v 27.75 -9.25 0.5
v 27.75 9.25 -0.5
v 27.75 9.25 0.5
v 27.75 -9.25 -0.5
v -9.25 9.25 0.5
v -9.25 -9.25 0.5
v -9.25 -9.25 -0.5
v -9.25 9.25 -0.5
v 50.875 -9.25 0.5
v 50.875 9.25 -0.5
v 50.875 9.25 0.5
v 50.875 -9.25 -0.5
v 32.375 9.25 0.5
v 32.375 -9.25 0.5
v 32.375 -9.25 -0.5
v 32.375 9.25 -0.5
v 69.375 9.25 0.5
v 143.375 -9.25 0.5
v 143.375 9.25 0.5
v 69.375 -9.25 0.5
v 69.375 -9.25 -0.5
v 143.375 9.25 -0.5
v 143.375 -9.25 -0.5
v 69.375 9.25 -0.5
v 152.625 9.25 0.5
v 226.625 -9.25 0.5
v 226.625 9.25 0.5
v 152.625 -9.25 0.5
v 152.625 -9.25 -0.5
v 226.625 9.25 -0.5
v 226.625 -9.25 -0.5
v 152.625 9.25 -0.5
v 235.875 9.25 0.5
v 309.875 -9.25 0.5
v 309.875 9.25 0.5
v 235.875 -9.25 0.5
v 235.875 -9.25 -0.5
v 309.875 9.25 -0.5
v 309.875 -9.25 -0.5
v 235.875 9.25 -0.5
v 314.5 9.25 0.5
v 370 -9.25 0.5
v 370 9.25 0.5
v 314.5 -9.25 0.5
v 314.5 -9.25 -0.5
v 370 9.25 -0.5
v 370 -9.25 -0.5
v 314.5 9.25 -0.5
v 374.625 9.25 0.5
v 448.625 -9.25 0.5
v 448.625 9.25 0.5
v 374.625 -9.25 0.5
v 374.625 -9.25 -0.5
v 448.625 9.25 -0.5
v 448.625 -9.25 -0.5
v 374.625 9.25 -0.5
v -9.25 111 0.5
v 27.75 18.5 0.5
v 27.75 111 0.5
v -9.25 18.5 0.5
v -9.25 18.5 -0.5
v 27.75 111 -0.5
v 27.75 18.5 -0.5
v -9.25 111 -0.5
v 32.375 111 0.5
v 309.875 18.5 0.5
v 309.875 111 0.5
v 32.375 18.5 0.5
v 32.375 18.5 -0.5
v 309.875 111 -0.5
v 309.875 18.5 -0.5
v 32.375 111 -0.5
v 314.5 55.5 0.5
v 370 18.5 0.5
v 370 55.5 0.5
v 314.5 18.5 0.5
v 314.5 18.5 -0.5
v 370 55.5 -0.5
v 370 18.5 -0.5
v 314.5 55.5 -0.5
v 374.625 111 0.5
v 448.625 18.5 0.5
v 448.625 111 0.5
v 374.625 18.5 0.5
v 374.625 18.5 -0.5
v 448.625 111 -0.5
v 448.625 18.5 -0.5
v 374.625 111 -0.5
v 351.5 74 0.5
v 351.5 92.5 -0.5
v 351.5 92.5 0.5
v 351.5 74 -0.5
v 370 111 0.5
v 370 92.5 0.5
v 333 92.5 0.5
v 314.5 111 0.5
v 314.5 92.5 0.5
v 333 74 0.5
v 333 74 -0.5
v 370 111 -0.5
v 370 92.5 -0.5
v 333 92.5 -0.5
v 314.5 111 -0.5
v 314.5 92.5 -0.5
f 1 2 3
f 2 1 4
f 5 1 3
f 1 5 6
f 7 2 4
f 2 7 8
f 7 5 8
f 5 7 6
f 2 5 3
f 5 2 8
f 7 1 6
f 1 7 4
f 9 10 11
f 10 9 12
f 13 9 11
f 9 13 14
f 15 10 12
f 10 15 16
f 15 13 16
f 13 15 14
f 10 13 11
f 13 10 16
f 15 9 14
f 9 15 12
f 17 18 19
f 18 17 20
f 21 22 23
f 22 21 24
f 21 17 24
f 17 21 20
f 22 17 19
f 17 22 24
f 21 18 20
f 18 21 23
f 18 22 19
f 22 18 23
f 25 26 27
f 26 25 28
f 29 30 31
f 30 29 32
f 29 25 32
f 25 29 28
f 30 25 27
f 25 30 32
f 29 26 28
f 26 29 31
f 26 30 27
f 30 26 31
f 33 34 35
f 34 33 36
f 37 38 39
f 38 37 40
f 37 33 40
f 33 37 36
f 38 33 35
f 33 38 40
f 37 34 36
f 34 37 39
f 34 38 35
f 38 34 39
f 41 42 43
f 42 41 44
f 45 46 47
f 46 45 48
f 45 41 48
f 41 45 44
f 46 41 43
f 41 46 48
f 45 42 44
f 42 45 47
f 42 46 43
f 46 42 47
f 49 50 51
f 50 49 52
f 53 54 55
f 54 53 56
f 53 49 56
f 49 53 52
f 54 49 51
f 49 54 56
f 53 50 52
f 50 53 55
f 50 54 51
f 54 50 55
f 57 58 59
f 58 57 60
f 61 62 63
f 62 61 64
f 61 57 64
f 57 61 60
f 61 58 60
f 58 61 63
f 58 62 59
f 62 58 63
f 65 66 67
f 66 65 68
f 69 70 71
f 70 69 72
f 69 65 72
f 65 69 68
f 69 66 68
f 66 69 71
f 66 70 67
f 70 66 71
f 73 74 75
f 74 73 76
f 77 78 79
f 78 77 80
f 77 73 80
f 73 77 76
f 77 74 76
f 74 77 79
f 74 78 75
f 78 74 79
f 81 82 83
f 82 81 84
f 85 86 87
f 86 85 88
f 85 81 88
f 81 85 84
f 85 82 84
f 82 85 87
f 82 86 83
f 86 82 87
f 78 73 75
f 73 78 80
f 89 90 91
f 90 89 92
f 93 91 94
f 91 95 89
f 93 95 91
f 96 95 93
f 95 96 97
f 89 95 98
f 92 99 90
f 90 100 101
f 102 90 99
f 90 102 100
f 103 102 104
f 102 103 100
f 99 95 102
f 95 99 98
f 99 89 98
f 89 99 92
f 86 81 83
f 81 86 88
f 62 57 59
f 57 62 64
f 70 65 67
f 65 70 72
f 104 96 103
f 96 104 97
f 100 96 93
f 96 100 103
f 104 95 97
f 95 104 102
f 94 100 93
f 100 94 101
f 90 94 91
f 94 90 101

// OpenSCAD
translate(v=[0, 0, 0]){
    translate(v=[0, 0, 0]){
        translate(v=[9.25, 0.0, 0]){
            cube(size=[37.0, 18.5, 1], center=true);
        };
        translate(v=[41.625, 0.0, 0]){
            cube(size=[18.5, 18.5, 1], center=true);
        };
        translate(v=[78.625, 0.0, 0]){
            cube(size=[18.5, 18.5, 1], center=true);
        };
        translate(v=[97.125, 0.0, 0]){
            cube(size=[18.5, 18.5, 1], center=true);
        };
        translate(v=[115.625, 0.0, 0]){
            cube(size=[18.5, 18.5, 1], center=true);
        };
        translate(v=[134.125, 0.0, 0]){
            cube(size=[18.5, 18.5, 1], center=true);
        };
        translate(v=[161.875, 0.0, 0]){
            cube(size=[18.5, 18.5, 1], center=true);
        };
        translate(v=[180.375, 0.0, 0]){
            cube(size=[18.5, 18.5, 1], center=true);
        };
        translate(v=[198.875, 0.0, 0]){
            cube(size=[18.5, 18.5, 1], center=true);
        };
        translate(v=[217.375, 0.0, 0]){
            cube(size=[18.5, 18.5, 1], center=true);
        };
        translate(v=[245.125, 0.0, 0]){
            cube(size=[18.5, 18.5, 1], center=true);
        };
        translate(v=[263.625, 0.0, 0]){
            cube(size=[18.5, 18.5, 1], center=true);
        };
        translate(v=[282.125, 0.0, 0]){
            cube(size=[18.5, 18.5, 1], center=true);
        };
        translate(v=[300.625, 0.0, 0]){
            cube(size=[18.5, 18.5, 1], center=true);
        };
        translate(v=[323.75, 0.0, 0]){
            cube(size=[18.5, 18.5, 1], center=true);
        };
        translate(v=[342.25, 0.0, 0]){
            cube(size=[18.5, 18.5, 1], center=true);
        };
        translate(v=[360.75, 0.0, 0]){
            cube(size=[18.5, 18.5, 1], center=true);
        };
        translate(v=[383.875, 0.0, 0]){
            cube(size=[18.5, 18.5, 1], center=true);
        };
        translate(v=[402.375, 0.0, 0]){
            cube(size=[18.5, 18.5, 1], center=true);
        };
        translate(v=[420.875, 0.0, 0]){
            cube(size=[18.5, 18.5, 1], center=true);
        };
        translate(v=[439.375, 0.0, 0]){
            cube(size=[18.5, 18.5, 1], center=true);
        };
        translate(v=[0.0, 27.75, 0]){
            cube(size=[18.5, 18.5, 1], center=true);
        };
        translate(v=[18.5, 27.75, 0]){
            cube(size=[18.5, 18.5, 1], center=true);
        };
        translate(v=[41.625, 27.75, 0]){
            cube(size=[18.5, 18.5, 1], center=true);
        };
        translate(v=[60.125, 27.75, 0]){
            cube(size=[18.5, 18.5, 1], center=true);
        };
        translate(v=[78.625, 27.75, 0]){
            cube(size=[18.5, 18.5, 1], center=true);
        };
        translate(v=[97.125, 27.75, 0]){
            cube(size=[18.5, 18.5, 1], center=true);
        };
        translate(v=[115.625, 27.75, 0]){
            cube(size=[18.5, 18.5, 1], center=true);
        };
        translate(v=[134.125, 27.75, 0]){
            cube(size=[18.5, 18.5, 1], center=true);
        };
        translate(v=[152.625, 27.75, 0]){
            cube(size=[18.5, 18.5, 1], center=true);
        };
        translate(v=[171.125, 27.75, 0]){
            cube(size=[18.5, 18.5, 1], center=true);
        };
        translate(v=[189.625, 27.75, 0]){
            cube(size=[18.5, 18.5, 1], center=true);
        };
        translate(v=[208.125, 27.75, 0]){
            cube(size=[18.5, 18.5, 1], center=true);
        };
        translate(v=[226.625, 27.75, 0]){
            cube(size=[18.5, 18.5, 1], center=true);
        };
        translate(v=[245.125, 27.75, 0]){
            cube(size=[18.5, 18.5, 1], center=true);
        };
        translate(v=[263.625, 27.75, 0]){
            cube(size=[18.5, 18.5, 1], center=true);
        };
        translate(v=[291.375, 27.75, 0]){
            cube(size=[37.0, 18.5, 1], center=true);
        };
        translate(v=[323.75, 27.75, 0]){
            cube(size=[18.5, 18.5, 1], center=true);
        };
        translate(v=[342.25, 27.75, 0]){
            cube(size=[18.5, 18.5, 1], center=true);
        };
        translate(v=[360.75, 27.75, 0]){
            cube(size=[18.5, 18.5, 1], center=true);
        };
        translate(v=[383.875, 27.75, 0]){
            cube(size=[18.5, 18.5, 1], center=true);
        };
        translate(v=[402.375, 27.75, 0]){
            cube(size=[18.5, 18.5, 1], center=true);
        };
        translate(v=[420.875, 27.75, 0]){
            cube(size=[18.5, 18.5, 1], center=true);
        };
        translate(v=[439.375, 27.75, 0]){
            cube(size=[18.5, 18.5, 1], center=true);
        };
        translate(v=[0.0, 46.25, 0]){
            cube(size=[18.5, 18.5, 1], center=true);
        };
        translate(v=[18.5, 46.25, 0]){
            cube(size=[18.5, 18.5, 1], center=true);
        };
        translate(v=[46.25, 46.25, 0]){
            cube(size=[27.75, 18.5, 1], center=true);
        };
        translate(v=[69.375, 46.25, 0]){
            cube(size=[18.5, 18.5, 1], center=true);
        };
        translate(v=[87.875, 46.25, 0]){
            cube(size=[18.5, 18.5, 1], center=true);
        };
        translate(v=[106.375, 46.25, 0]){
            cube(size=[18.5, 18.5, 1], center=true);
        };
        translate(v=[124.875, 46.25, 0]){
            cube(size=[18.5, 18.5, 1], center=true);
        };
        translate(v=[143.375, 46.25, 0]){
            cube(size=[18.5, 18.5, 1], center=true);
        };
        translate(v=[161.875, 46.25, 0]){
            cube(size=[18.5, 18.5, 1], center=true);
        };
        translate(v=[180.375, 46.25, 0]){
            cube(size=[18.5, 18.5, 1], center=true);
        };
        translate(v=[198.875, 46.25, 0]){
            cube(size=[18.5, 18.5, 1], center=true);
        };
        translate(v=[217.375, 46.25, 0]){
            cube(size=[18.5, 18.5, 1], center=true);
        };
        translate(v=[235.875, 46.25, 0]){
            cube(size=[18.5, 18.5, 1], center=true);
        };
        translate(v=[254.375, 46.25, 0]){
            cube(size=[18.5, 18.5, 1], center=true);
        };
        translate(v=[272.875, 46.25, 0]){
            cube(size=[18.5, 18.5, 1], center=true);
        };
        translate(v=[293.6875, 46.25, 0]){
            cube(size=[27.75, 18.5, 1], center=true);
        };
        translate(v=[298.3125, 55.5, 0]){
            cube(size=[23.125, 37.0, 1], center=true);
        };
        translate(v=[323.75, 46.25, 0]){
            cube(size=[18.5, 18.5, 1], center=true);
        };
        translate(v=[342.25, 46.25, 0]){
            cube(size=[18.5, 18.5, 1], center=true);
        };
        translate(v=[360.75, 46.25, 0]){
            cube(size=[18.5, 18.5, 1], center=true);
        };
        translate(v=[383.875, 46.25, 0]){
            cube(size=[18.5, 18.5, 1], center=true);
        };
        translate(v=[402.375, 46.25, 0]){
            cube(size=[18.5, 18.5, 1], center=true);
        };
        translate(v=[420.875, 46.25, 0]){
            cube(size=[18.5, 18.5, 1], center=true);
        };
        translate(v=[439.375, 55.5, 0]){
            cube(size=[18.5, 37.0, 1], center=true);
        };
        translate(v=[0.0, 64.75, 0]){
            cube(size=[18.5, 18.5, 1], center=true);
        };
        translate(v=[18.5, 64.75, 0]){
            cube(size=[18.5, 18.5, 1], center=true);
        };
        translate(v=[48.5625, 64.75, 0]){
            cube(size=[32.375, 18.5, 1], center=true);
        };
        translate(v=[74.0, 64.75, 0]){
            cube(size=[18.5, 18.5, 1], center=true);
        };
        translate(v=[92.5, 64.75, 0]){
            cube(size=[18.5, 18.5, 1], center=true);
        };
        translate(v=[111.0, 64.75, 0]){
            cube(size=[18.5, 18.5, 1], center=true);
        };
        translate(v=[129.5, 64.75, 0]){
            cube(size=[18.5, 18.5, 1], center=true);
        };
        translate(v=[148.0, 64.75, 0]){
            cube(size=[18.5, 18.5, 1], center=true);
        };
        translate(v=[166.5, 64.75, 0]){
            cube(size=[18.5, 18.5, 1], center=true);
        };
        translate(v=[185.0, 64.75, 0]){
            cube(size=[18.5, 18.5, 1], center=true);
        };
        translate(v=[203.5, 64.75, 0]){
            cube(size=[18.5, 18.5, 1], center=true);
        };
        translate(v=[222.0, 64.75, 0]){
            cube(size=[18.5, 18.5, 1], center=true);
        };
        translate(v=[240.5, 64.75, 0]){
            cube(size=[18.5, 18.5, 1], center=true);
        };
        translate(v=[259.0, 64.75, 0]){
            cube(size=[18.5, 18.5, 1], center=true);
        };
        translate(v=[277.5, 64.75, 0]){
            cube(size=[18.5, 18.5, 1], center=true);
        };
        translate(v=[383.875, 64.75, 0]){
            cube(size=[18.5, 18.5, 1], center=true);
        };
        translate(v=[402.375, 64.75, 0]){
            cube(size=[18.5, 18.5, 1], center=true);
        };
        translate(v=[420.875, 64.75, 0]){
            cube(size=[18.5, 18.5, 1], center=true);
        };
        translate(v=[0.0, 83.25, 0]){
            cube(size=[18.5, 18.5, 1], center=true);
        };
        translate(v=[18.5, 83.25, 0]){
            cube(size=[18.5, 18.5, 1], center=true);
        };
        translate(v=[43.9375, 83.25, 0]){
            cube(size=[23.125, 18.5, 1], center=true);
        };
        translate(v=[64.75, 83.25, 0]){
            cube(size=[18.5, 18.5, 1], center=true);
        };
        translate(v=[83.25, 83.25, 0]){
            cube(size=[18.5, 18.5, 1], center=true);
        };
        translate(v=[101.75, 83.25, 0]){
            cube(size=[18.5, 18.5, 1], center=true);
        };
        translate(v=[120.25, 83.25, 0]){
            cube(size=[18.5, 18.5, 1], center=true);
        };
        translate(v=[138.75, 83.25, 0]){
            cube(size=[18.5, 18.5, 1], center=true);
        };
        translate(v=[157.25, 83.25, 0]){
            cube(size=[18.5, 18.5, 1], center=true);
        };
        translate(v=[175.75, 83.25, 0]){
            cube(size=[18.5, 18.5, 1], center=true);
        };
        translate(v=[194.25, 83.25, 0]){
            cube(size=[18.5, 18.5, 1], center=true);
        };
        translate(v=[212.75, 83.25, 0]){
            cube(size=[18.5, 18.5, 1], center=true);
        };
        translate(v=[231.25, 83.25, 0]){
            cube(size=[18.5, 18.5, 1], center=true);
        };
        translate(v=[249.75, 83.25, 0]){
            cube(size=[18.5, 18.5, 1], center=true);
        };
        translate(v=[284.4375, 83.25, 0]){
            cube(size=[50.875, 18.5, 1], center=true);
        };
        translate(v=[342.25, 83.25, 0]){
            cube(size=[18.5, 18.5, 1], center=true);
        };
        translate(v=[383.875, 83.25, 0]){
            cube(size=[18.5, 18.5, 1], center=true);
        };
        translate(v=[402.375, 83.25, 0]){
            cube(size=[18.5, 18.5, 1], center=true);
        };
        translate(v=[420.875, 83.25, 0]){
            cube(size=[18.5, 18.5, 1], center=true);
        };
        translate(v=[439.375, 92.5, 0]){
            cube(size=[18.5, 37.0, 1], center=true);
        };
        translate(v=[0.0, 101.75, 0]){
            cube(size=[18.5, 18.5, 1], center=true);
        };
        translate(v=[18.5, 101.75, 0]){
            cube(size=[18.5, 18.5, 1], center=true);
        };
        translate(v=[43.9375, 101.75, 0]){
            cube(size=[23.125, 18.5, 1], center=true);
        };
        translate(v=[67.0625, 101.75, 0]){
            cube(size=[23.125, 18.5, 1], center=true);
        };
        translate(v=[90.1875, 101.75, 0]){
            cube(size=[23.125, 18.5, 1], center=true);
        };
        translate(v=[159.5625, 101.75, 0]){
            cube(size=[115.625, 18.5, 1], center=true);
        };
        translate(v=[228.9375, 101.75, 0]){
            cube(size=[23.125, 18.5, 1], center=true);
        };
        translate(v=[252.0625, 101.75, 0]){
            cube(size=[23.125, 18.5, 1], center=true);
        };
        translate(v=[275.1875, 101.75, 0]){
            cube(size=[23.125, 18.5, 1], center=true);
        };
        translate(v=[298.3125, 101.75, 0]){
            cube(size=[23.125, 18.5, 1], center=true);
        };
        translate(v=[323.75, 101.75, 0]){
            cube(size=[18.5, 18.5, 1], center=true);
        };
        translate(v=[342.25, 101.75, 0]){
            cube(size=[18.5, 18.5, 1], center=true);
        };
        translate(v=[360.75, 101.75, 0]){
            cube(size=[18.5, 18.5, 1], center=true);
        };
        translate(v=[393.125, 101.75, 0]){
            cube(size=[37.0, 18.5, 1], center=true);
        };
        translate(v=[420.875, 101.75, 0]){
            cube(size=[18.5, 18.5, 1], center=true);
        };
    };
};
